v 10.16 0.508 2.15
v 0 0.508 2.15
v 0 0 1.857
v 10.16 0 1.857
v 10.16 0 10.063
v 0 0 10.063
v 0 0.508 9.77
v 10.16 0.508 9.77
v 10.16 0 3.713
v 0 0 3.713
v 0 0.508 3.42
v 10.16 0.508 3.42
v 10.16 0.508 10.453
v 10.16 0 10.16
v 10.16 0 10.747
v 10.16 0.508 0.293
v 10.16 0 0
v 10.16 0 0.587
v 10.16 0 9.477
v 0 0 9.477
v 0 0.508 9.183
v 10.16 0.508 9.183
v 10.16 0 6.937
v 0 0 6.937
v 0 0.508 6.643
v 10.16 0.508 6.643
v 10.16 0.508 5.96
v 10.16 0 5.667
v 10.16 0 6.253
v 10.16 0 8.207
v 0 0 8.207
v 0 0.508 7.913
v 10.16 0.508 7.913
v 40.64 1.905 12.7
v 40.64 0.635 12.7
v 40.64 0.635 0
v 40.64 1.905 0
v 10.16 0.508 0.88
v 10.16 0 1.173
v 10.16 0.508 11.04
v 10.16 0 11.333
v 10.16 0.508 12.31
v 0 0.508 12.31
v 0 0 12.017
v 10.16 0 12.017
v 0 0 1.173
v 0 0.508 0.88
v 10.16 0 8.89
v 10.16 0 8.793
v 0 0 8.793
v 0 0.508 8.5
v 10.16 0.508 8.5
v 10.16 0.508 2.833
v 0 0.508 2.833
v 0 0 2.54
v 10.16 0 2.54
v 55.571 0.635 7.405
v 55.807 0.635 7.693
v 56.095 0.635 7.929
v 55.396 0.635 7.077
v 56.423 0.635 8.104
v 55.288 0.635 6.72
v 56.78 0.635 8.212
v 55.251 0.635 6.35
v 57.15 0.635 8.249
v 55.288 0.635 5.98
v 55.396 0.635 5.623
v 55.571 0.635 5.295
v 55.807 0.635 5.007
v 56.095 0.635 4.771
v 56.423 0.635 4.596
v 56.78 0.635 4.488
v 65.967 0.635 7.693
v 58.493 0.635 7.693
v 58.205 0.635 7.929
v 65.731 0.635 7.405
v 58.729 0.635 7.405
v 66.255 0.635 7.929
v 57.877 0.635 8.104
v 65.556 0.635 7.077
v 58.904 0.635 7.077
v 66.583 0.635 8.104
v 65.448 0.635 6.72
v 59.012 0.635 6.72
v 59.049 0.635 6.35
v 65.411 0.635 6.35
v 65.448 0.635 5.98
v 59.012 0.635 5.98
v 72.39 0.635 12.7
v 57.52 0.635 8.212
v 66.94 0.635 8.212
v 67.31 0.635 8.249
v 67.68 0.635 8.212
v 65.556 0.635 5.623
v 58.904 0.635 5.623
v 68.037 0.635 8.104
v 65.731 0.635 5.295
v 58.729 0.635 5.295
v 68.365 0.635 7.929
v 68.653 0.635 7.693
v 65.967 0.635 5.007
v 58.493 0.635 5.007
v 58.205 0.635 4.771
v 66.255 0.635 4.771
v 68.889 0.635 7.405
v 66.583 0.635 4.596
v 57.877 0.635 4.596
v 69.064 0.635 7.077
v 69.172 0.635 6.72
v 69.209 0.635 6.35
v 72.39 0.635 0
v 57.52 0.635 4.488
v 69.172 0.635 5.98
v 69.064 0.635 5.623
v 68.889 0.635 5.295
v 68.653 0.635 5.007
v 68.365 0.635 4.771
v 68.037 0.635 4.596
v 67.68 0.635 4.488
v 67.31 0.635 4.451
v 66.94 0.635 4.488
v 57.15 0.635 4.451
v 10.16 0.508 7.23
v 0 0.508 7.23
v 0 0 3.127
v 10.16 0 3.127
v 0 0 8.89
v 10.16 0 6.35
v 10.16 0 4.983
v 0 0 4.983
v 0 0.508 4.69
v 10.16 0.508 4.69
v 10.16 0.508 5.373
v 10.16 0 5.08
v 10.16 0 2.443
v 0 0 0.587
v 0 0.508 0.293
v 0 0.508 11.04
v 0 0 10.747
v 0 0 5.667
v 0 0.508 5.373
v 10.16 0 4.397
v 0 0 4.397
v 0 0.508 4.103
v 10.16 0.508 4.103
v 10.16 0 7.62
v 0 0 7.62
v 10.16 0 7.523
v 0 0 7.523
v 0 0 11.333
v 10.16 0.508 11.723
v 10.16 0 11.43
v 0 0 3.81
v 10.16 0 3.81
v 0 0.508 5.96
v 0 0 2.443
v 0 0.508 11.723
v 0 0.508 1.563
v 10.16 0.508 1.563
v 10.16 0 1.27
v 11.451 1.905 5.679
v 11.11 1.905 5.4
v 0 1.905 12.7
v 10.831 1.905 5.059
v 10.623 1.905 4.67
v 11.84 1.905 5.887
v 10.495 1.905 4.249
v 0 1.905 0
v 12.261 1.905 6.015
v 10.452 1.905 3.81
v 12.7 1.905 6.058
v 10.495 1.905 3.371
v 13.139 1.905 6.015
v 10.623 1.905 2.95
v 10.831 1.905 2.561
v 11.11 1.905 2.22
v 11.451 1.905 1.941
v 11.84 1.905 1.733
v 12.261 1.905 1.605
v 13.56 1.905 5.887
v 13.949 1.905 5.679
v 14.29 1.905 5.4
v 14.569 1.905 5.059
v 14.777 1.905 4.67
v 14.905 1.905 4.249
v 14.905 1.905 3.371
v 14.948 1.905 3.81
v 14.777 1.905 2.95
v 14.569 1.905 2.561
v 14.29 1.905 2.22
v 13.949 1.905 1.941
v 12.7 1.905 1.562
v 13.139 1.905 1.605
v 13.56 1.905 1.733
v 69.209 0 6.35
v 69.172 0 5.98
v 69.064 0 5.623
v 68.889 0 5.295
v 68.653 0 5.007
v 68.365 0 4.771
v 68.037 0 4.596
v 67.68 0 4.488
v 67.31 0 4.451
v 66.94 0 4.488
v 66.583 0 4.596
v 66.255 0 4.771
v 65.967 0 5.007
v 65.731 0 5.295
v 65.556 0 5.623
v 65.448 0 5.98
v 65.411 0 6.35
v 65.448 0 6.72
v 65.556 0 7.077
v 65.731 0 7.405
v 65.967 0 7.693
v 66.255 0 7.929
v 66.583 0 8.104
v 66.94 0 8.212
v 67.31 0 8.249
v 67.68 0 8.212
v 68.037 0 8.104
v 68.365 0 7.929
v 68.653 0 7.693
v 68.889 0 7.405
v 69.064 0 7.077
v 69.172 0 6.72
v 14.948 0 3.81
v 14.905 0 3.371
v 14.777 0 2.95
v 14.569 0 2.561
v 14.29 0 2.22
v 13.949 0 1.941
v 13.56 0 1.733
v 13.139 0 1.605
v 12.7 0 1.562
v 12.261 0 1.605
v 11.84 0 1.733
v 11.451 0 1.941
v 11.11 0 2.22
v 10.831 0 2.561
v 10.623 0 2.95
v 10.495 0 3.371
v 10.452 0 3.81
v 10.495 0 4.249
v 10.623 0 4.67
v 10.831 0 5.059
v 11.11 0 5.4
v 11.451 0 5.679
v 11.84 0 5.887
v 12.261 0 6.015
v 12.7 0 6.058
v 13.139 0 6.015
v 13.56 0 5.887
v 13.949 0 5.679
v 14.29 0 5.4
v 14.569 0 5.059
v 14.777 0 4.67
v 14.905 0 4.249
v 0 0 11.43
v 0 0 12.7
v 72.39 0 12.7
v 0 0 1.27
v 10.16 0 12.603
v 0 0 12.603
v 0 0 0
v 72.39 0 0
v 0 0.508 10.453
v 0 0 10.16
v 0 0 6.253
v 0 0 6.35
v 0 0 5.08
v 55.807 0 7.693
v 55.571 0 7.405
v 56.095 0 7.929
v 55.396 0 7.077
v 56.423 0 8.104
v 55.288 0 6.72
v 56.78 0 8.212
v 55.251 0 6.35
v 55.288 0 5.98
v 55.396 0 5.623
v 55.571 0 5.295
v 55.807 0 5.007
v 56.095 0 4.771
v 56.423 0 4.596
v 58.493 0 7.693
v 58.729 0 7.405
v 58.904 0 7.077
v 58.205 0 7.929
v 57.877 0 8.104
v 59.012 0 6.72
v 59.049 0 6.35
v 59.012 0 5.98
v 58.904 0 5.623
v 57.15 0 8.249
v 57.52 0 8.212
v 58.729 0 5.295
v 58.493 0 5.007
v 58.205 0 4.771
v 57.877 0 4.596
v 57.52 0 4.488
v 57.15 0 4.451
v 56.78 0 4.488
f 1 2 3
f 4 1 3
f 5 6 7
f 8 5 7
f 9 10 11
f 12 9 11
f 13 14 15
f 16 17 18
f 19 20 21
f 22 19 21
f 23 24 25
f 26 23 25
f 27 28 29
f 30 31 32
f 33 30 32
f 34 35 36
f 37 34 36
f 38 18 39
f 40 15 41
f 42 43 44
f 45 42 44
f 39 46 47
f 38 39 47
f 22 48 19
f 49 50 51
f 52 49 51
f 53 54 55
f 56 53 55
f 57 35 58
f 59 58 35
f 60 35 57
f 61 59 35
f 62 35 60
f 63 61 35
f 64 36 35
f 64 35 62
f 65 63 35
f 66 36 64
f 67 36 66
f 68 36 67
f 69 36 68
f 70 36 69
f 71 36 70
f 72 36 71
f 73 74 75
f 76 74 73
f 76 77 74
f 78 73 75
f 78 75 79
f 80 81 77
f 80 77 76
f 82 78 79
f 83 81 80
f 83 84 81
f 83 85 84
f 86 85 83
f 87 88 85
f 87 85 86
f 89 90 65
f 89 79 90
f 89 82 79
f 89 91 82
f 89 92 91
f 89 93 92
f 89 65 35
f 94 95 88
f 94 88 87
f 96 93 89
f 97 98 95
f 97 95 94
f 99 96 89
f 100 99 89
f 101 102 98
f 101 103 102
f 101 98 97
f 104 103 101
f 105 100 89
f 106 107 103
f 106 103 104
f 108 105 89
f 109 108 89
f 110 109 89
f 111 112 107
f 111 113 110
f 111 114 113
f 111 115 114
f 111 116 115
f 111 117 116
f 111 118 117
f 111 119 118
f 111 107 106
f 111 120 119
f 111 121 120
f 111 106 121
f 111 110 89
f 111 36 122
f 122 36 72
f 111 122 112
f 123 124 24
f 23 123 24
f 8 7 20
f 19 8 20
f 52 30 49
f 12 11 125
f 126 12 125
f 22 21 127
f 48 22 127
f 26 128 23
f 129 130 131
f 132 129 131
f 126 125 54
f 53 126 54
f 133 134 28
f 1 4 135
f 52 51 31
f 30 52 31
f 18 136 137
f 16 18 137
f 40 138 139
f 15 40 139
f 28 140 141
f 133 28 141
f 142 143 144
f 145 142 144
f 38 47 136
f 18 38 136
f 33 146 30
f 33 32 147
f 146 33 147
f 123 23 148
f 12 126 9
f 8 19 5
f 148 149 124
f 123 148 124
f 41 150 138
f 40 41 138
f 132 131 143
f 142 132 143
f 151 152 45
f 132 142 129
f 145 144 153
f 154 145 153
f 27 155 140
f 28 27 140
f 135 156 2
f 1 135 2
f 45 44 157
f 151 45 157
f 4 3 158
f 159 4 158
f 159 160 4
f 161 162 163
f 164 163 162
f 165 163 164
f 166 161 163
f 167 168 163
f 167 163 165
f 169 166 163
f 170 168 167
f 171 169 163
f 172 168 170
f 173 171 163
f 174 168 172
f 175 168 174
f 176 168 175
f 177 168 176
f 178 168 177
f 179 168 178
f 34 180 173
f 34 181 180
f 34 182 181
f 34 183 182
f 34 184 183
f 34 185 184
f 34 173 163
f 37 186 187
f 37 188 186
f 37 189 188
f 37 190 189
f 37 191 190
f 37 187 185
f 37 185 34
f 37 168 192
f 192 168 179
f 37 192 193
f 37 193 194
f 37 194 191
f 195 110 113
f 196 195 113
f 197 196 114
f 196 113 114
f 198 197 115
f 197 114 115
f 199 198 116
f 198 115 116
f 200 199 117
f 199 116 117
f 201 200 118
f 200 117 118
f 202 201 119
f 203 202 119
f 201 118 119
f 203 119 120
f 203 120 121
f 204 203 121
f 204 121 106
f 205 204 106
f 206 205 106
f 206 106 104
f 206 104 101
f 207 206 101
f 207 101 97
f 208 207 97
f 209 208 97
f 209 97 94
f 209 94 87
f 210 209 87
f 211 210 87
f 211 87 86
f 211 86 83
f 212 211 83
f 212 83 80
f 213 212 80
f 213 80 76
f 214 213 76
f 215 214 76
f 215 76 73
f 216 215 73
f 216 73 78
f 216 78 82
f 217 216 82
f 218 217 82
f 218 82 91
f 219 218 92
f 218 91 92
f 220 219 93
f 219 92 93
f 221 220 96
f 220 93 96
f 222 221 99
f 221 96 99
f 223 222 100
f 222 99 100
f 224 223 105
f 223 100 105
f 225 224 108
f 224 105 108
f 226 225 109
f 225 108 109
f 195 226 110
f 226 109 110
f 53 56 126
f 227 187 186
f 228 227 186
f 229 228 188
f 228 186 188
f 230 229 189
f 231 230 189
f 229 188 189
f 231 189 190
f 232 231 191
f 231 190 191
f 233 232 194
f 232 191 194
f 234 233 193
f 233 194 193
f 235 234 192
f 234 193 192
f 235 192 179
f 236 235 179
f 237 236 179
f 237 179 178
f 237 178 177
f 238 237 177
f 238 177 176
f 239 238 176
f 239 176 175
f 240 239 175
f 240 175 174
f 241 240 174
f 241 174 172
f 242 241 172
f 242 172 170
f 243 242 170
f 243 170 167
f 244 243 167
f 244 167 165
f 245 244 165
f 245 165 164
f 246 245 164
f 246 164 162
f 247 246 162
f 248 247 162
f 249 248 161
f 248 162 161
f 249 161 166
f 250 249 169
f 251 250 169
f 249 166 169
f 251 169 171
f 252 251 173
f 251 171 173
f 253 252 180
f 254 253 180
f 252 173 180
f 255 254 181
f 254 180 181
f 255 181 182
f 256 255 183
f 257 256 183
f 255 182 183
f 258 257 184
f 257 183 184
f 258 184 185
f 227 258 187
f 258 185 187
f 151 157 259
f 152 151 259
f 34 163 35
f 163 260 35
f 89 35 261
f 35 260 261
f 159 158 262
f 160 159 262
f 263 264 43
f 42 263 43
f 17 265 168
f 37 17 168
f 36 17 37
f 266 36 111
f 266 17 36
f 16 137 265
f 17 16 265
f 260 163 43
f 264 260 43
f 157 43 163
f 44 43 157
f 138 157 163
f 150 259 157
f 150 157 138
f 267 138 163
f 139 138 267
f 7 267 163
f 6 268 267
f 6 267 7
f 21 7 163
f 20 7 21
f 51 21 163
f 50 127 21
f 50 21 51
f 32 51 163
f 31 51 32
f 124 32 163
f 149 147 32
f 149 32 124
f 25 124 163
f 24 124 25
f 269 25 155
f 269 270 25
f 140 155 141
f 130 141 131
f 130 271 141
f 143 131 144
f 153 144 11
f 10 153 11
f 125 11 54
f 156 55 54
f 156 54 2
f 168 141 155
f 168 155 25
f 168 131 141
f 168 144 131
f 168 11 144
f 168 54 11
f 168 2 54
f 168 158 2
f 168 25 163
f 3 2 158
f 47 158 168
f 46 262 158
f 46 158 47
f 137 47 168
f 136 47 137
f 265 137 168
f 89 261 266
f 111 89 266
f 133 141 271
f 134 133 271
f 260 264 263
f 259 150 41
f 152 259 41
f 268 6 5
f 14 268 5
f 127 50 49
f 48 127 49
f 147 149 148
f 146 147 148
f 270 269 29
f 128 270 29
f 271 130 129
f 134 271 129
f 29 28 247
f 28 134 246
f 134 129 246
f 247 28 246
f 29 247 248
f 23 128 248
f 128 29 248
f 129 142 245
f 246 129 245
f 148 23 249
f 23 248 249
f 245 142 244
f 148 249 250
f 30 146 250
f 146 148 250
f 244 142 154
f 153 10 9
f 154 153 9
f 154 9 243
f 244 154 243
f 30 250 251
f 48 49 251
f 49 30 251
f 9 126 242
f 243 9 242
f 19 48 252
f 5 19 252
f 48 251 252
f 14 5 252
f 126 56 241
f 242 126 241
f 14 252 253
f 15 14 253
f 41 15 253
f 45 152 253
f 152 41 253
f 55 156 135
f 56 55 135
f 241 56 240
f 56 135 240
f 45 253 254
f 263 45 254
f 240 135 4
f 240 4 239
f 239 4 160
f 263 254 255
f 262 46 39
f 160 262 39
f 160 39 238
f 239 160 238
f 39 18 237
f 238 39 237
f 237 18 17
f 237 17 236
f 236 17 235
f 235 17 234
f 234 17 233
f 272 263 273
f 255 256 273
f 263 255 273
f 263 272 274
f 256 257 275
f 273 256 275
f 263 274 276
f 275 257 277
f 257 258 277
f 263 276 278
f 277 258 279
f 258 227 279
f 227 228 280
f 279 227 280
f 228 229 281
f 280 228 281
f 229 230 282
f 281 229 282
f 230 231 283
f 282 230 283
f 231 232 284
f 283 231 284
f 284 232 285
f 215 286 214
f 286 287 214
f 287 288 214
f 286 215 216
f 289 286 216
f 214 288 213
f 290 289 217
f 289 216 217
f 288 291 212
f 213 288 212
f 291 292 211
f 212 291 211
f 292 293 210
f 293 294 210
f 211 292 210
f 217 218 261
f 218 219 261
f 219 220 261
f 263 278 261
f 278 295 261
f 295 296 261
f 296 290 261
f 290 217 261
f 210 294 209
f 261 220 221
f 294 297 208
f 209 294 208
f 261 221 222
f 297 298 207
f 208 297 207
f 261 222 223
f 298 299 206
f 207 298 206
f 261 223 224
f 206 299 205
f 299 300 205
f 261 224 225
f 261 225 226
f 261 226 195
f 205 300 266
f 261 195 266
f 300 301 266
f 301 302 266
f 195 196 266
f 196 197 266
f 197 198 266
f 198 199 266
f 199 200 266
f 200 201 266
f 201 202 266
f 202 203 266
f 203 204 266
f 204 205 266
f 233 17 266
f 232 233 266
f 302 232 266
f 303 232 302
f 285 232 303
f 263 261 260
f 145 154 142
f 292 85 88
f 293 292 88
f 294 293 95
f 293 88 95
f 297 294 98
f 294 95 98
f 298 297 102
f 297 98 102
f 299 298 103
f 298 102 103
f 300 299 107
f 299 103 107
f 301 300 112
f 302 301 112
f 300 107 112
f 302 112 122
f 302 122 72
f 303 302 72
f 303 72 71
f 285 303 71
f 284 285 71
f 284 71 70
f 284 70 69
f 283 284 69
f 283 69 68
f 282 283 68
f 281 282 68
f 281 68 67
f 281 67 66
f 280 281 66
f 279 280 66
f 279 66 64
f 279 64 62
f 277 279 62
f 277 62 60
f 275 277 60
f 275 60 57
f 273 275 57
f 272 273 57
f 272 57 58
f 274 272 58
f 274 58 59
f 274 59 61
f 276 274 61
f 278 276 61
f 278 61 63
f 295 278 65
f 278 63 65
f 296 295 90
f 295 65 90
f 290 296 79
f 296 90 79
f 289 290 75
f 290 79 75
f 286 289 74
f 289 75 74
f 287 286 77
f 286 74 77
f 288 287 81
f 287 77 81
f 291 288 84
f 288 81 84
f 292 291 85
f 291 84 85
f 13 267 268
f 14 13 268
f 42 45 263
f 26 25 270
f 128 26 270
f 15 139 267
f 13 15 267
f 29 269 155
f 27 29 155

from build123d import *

# Parameters (mm, degrees)
SKETCH1_W               = 72.39
SKETCH1_H               = 12.7
BOSS_EXTRUDE1_DEPTH     = 0.635
SKETCH2_W               = 40.64
SKETCH2_H               = 12.7
BOSS_EXTRUDE2_DEPTH     = 1.27
F_6_CLEARANCE_HOLE1_D   = 3.7973
F_8_CLEARANCE_HOLE1_D   = 4.4958
CUT_EXTRUDE6_DEPTH      = 1
CUT_EXTRUDE6_DEPTH_BACK = 10.16


with BuildPart() as part:
    # Sketch1 → Boss-Extrude1 (new body)
    with BuildSketch(Plane(origin=(0, 0, 0), x_dir=(1, 0, 0), z_dir=(0, 1, 0))):
        with Locations((36.195, -6.35)):
            Rectangle(SKETCH1_W, SKETCH1_H)
    extrude(amount=BOSS_EXTRUDE1_DEPTH)

    # Sketch2 → Boss-Extrude2 (add)
    with BuildSketch(Plane(origin=(0, 0.635, 0), x_dir=(1, 0, 0), z_dir=(0, 1, 0))):
        with Locations((20.32, -6.35)):
            Rectangle(SKETCH2_W, SKETCH2_H)
    extrude(amount=BOSS_EXTRUDE2_DEPTH)

    # #6 Clearance Hole1 (through all)
    with Locations(Plane(origin=(0, 0, 0), x_dir=(-1, 0, 0), z_dir=(0, -1, 0))):
        with Locations((-67.31, -6.35), (-57.15, -6.35)):
            Hole(F_6_CLEARANCE_HOLE1_D / 2)

    # #8 Clearance Hole1 (through all)
    with Locations(Plane(origin=(0, 0, 0), x_dir=(-1, 0, 0), z_dir=(0, -1, 0))):
        with Locations((-12.7, -3.81)):
            Hole(F_8_CLEARANCE_HOLE1_D / 2)

    # Sketch9 → Cut-Extrude6 (cut, two sides)
    with BuildSketch(Plane.ZY) as cut_extrude6_sk:
        Polygon((1.563293937, 0.508), (1.27, 0), (1.856587873, 0), align=None)
        Polygon((2.14988181, 0.508), (1.856587873, 0), (2.443175747, 0), align=None)
        Polygon((0.87988181, 0.508), (0.586587873, 0), (1.173175747, 0), align=None)
        Polygon((0.293293937, 0.508), (0, 0), (0.586587873, 0), align=None)
        Polygon((2.833293937, 0.508), (2.54, 0), (3.126587873, 0), align=None)
        Polygon((3.41988181, 0.508), (3.126587873, 0), (3.713175747, 0), align=None)
        Polygon((4.103293937, 0.508), (3.81, 0), (4.396587873, 0), align=None)
        Polygon((4.68988181, 0.508), (4.396587873, 0), (4.983175747, 0), align=None)
        Polygon((5.373293937, 0.508), (5.08, 0), (5.666587873, 0), align=None)
        Polygon((5.95988181, 0.508), (5.666587873, 0), (6.253175747, 0), align=None)
        Polygon((6.643293937, 0.508), (6.35, 0), (6.936587873, 0), align=None)
        Polygon((7.22988181, 0.508), (6.936587873, 0), (7.523175747, 0), align=None)
        Polygon((7.913293937, 0.508), (7.62, 0), (8.206587873, 0), align=None)
        Polygon((8.49988181, 0.508), (8.206587873, 0), (8.793175747, 0), align=None)
        Polygon((9.183293937, 0.508), (8.89, 0), (9.476587873, 0), align=None)
        Polygon((9.76988181, 0.508), (9.476587873, 0), (10.063175747, 0), align=None)
        Polygon((10.453293937, 0.508), (10.16, 0), (10.746587873, 0), align=None)
        Polygon((11.03988181, 0.508), (10.746587873, 0), (11.333175747, 0), align=None)
        Polygon((11.723293937, 0.508), (11.43, 0), (12.016587873, 0), align=None)
        Polygon((12.30988181, 0.508), (12.016587873, 0), (12.603175747, 0), align=None)
    extrude(amount=CUT_EXTRUDE6_DEPTH, mode=Mode.SUBTRACT)
    extrude(cut_extrude6_sk.sketch, amount=-CUT_EXTRUDE6_DEPTH_BACK, mode=Mode.SUBTRACT)


solid = part.part
